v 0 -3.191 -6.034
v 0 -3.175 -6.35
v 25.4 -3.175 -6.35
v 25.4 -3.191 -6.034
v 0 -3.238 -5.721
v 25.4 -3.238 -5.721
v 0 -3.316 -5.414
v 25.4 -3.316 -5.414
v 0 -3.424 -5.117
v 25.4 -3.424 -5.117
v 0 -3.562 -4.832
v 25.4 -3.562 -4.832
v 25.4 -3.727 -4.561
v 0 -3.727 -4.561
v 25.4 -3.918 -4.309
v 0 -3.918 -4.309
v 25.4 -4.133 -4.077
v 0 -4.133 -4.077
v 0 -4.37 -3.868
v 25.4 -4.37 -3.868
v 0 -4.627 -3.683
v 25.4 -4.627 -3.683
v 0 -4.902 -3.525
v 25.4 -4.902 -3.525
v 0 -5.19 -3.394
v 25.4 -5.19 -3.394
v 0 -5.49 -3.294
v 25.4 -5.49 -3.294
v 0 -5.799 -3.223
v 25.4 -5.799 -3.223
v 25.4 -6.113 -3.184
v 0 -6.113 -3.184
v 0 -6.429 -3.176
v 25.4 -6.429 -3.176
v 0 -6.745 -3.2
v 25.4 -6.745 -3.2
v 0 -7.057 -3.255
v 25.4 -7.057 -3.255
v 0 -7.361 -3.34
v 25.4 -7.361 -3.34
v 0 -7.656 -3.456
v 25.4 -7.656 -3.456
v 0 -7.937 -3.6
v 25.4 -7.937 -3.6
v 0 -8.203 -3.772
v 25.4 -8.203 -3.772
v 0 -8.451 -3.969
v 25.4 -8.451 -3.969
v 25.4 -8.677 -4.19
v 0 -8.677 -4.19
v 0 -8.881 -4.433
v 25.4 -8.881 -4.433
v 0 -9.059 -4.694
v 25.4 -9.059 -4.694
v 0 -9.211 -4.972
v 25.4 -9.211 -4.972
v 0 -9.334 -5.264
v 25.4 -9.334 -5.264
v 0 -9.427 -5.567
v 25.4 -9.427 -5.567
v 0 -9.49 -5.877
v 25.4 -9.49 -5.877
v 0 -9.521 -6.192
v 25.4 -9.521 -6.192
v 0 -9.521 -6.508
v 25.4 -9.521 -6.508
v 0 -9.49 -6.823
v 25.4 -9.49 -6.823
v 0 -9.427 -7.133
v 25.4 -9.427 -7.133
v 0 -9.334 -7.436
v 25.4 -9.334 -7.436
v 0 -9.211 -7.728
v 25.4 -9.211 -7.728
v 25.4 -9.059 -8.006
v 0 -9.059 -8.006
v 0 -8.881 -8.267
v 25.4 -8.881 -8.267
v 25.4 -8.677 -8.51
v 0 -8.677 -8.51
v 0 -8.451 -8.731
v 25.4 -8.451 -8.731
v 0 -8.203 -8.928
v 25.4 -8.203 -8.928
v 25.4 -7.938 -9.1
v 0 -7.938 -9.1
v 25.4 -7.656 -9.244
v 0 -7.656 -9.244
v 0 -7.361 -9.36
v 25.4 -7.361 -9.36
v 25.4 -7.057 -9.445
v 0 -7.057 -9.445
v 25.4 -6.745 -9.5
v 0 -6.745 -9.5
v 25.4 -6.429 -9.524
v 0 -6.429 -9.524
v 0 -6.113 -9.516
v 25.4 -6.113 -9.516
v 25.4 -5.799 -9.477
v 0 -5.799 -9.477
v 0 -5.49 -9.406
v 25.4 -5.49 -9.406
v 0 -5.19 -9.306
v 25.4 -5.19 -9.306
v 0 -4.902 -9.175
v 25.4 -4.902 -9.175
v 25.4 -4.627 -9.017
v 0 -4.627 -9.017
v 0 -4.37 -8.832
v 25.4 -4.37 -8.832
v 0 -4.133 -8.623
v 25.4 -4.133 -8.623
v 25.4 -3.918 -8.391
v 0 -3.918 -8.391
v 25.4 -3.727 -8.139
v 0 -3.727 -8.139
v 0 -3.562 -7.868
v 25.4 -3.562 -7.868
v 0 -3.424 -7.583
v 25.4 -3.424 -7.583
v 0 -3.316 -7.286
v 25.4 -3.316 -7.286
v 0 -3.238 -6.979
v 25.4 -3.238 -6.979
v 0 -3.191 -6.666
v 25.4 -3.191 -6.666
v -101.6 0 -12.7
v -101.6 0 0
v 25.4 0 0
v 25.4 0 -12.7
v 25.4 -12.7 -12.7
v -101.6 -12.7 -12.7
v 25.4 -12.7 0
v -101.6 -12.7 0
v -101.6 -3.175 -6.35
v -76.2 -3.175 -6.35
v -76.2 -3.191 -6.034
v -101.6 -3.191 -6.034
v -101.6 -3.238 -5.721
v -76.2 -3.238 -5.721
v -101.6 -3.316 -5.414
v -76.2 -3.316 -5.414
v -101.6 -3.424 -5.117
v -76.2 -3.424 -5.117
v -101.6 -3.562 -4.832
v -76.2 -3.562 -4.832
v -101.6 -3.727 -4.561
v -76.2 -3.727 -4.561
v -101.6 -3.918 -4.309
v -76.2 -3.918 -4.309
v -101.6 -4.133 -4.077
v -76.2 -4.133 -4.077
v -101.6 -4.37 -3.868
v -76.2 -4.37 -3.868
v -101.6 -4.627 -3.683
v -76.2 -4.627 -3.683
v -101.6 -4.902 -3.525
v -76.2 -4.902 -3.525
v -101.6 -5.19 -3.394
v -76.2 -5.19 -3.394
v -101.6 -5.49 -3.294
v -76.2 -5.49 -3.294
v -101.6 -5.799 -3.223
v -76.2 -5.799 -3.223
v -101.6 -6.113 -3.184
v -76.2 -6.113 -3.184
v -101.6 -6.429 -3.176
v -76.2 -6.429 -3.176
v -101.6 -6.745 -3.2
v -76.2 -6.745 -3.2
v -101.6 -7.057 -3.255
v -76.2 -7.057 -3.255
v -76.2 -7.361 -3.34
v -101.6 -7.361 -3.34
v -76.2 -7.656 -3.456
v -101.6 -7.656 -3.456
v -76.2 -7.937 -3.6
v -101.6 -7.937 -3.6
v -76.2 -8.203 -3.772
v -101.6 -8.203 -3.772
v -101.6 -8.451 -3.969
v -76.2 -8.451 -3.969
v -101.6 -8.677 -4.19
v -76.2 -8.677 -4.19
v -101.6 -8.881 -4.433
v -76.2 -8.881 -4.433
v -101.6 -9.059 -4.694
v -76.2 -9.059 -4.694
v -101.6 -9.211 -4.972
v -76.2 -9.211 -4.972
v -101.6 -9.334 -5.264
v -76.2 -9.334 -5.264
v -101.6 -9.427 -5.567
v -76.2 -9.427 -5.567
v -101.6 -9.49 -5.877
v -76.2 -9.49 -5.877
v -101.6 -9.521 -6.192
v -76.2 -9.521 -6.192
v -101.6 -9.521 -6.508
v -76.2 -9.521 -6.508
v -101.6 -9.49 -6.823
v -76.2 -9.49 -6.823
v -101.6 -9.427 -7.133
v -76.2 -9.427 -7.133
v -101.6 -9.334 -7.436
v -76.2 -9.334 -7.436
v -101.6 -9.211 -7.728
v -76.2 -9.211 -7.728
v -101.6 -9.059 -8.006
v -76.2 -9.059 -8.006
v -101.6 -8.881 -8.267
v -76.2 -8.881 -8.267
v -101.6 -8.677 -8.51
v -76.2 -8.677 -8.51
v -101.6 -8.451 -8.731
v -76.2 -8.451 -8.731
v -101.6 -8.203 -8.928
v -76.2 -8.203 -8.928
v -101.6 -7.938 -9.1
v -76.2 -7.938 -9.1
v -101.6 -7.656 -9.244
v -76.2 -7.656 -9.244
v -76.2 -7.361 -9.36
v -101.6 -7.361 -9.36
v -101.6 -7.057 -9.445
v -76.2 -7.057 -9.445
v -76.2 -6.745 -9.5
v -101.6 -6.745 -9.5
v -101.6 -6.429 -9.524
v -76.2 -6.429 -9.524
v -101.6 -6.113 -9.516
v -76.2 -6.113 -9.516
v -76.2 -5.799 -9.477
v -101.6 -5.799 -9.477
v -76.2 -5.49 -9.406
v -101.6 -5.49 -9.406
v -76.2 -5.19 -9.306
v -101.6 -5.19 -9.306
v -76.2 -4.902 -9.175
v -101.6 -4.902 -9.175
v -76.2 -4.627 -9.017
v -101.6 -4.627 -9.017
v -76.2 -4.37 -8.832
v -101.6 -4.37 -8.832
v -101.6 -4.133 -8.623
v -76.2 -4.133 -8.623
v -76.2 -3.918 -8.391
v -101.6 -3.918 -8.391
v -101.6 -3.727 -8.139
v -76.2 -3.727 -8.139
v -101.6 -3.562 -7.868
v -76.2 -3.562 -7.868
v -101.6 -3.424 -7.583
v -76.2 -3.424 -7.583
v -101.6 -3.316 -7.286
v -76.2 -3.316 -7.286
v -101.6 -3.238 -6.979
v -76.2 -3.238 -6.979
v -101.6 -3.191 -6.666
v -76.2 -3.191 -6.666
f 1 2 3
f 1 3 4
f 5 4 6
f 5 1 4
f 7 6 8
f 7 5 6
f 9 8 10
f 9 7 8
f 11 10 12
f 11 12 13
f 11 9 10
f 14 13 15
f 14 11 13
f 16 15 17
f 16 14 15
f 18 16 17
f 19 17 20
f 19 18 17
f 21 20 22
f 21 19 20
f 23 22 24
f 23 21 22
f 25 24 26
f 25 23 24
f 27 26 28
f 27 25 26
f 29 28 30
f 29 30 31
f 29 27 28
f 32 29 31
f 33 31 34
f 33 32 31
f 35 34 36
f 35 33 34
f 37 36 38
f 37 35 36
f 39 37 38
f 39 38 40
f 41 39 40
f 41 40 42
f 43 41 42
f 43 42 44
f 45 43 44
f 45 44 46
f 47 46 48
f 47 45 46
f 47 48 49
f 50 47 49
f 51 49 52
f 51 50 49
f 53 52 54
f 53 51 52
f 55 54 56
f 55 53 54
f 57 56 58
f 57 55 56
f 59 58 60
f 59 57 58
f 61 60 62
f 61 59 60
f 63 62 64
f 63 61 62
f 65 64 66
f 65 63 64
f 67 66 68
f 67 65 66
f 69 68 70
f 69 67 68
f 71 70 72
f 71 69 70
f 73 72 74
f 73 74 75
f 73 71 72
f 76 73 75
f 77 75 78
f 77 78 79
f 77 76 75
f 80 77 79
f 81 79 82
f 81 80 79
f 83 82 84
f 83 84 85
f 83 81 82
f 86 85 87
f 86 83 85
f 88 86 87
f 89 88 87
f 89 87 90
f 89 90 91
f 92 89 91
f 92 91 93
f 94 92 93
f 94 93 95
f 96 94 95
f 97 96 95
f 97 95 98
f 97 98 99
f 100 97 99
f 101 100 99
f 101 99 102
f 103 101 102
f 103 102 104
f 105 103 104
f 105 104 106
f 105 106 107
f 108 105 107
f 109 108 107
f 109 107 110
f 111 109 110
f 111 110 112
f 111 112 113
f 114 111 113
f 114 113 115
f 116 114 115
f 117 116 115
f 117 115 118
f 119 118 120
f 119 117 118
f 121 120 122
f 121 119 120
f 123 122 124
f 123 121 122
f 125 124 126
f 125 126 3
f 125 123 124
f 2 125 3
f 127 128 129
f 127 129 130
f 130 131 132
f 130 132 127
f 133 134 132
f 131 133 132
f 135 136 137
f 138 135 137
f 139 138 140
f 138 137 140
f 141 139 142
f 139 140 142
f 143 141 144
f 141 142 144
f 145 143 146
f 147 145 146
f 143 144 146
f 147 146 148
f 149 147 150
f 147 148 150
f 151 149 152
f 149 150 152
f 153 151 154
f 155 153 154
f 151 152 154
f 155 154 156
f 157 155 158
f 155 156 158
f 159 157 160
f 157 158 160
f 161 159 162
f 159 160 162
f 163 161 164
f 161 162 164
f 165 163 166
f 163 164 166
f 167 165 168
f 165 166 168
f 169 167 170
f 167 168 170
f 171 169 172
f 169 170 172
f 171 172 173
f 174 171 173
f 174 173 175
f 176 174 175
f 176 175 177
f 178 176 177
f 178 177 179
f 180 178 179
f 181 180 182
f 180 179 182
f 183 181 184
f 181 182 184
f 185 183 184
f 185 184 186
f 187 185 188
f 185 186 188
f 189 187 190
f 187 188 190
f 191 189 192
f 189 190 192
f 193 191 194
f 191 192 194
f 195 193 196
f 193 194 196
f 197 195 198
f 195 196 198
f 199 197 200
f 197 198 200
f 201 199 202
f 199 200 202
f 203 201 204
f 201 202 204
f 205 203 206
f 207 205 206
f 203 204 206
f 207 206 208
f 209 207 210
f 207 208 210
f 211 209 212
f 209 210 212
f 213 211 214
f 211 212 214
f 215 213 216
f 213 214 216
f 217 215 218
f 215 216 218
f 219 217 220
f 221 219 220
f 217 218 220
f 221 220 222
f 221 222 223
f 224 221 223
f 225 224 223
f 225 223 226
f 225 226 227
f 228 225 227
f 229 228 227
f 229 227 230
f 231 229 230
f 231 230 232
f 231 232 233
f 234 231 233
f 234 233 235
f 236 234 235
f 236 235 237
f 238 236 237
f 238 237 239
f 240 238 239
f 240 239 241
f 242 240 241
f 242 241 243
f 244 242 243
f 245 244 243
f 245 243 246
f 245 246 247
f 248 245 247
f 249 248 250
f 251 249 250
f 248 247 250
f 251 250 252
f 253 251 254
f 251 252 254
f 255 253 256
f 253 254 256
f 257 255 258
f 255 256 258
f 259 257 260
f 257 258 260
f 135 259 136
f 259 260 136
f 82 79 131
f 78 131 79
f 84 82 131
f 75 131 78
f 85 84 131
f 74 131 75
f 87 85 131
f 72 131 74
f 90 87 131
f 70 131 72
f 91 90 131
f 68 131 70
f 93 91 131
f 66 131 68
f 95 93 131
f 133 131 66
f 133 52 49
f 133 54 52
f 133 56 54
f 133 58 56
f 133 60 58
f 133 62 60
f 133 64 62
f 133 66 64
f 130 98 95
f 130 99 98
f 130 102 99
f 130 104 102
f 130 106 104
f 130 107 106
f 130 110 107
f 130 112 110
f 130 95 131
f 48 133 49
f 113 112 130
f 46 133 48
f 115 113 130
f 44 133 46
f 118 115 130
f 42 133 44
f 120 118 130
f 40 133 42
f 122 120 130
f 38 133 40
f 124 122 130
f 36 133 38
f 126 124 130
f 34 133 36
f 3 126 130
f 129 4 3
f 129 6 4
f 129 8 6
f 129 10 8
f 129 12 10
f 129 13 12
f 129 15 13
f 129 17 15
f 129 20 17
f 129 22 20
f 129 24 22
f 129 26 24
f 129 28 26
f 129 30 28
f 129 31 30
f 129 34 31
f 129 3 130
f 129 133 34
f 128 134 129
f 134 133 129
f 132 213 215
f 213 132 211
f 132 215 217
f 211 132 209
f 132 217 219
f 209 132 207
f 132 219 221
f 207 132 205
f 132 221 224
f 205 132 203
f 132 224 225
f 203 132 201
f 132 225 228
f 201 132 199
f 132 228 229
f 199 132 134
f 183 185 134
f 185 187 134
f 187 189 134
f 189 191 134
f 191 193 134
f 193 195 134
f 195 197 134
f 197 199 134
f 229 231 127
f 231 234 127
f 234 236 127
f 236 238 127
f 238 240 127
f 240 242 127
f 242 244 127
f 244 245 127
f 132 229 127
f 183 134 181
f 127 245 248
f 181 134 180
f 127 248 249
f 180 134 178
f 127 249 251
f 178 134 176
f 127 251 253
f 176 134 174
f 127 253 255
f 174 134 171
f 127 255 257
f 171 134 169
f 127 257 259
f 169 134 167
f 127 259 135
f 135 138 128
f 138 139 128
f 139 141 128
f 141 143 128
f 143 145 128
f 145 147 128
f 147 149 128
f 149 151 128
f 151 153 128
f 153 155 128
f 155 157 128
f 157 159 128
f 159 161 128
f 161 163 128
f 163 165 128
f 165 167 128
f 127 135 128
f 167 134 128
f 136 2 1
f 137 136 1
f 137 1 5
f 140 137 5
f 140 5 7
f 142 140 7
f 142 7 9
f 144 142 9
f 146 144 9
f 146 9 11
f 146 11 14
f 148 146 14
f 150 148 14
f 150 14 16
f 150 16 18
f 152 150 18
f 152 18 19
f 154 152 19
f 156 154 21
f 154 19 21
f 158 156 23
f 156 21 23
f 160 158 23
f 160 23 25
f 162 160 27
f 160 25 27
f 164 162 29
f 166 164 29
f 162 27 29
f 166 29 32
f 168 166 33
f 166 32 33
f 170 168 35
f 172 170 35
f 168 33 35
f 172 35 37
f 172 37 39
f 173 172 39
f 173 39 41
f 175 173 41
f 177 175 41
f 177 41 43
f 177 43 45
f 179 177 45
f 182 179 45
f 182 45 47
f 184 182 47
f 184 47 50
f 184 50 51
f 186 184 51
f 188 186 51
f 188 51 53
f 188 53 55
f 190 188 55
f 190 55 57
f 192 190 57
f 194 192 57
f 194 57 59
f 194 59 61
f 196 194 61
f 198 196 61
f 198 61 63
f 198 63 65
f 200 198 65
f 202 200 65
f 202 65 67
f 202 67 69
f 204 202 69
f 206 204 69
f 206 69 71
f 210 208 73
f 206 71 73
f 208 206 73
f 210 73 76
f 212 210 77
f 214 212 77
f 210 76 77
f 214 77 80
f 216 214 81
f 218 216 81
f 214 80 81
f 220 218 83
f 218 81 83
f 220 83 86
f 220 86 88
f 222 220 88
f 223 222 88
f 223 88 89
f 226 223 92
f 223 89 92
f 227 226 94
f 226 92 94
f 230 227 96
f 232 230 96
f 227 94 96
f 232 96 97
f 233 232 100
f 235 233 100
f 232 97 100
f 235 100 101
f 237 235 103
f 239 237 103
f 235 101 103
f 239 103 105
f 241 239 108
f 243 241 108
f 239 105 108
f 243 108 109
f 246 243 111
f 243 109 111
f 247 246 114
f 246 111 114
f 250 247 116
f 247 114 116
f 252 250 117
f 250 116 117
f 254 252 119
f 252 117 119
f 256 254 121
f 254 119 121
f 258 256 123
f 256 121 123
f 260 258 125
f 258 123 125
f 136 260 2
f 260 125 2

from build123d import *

# Parameters (mm, degrees)
F0_W     = 76.2
F0_H     = 12.7
F1_DEPTH = 12.7
F2_R     = 3.175
F3_DEPTH = 85.27917
F4_DEPTH = 25.4
F5_DEPTH = 25.4


with BuildPart() as f1:
    # F0 (on Top) → F1 (new body)
    with BuildSketch(Plane.XY):
        with Locations((-38.1, -6.35)):
            Rectangle(F0_W, F0_H)
    extrude(amount=-F1_DEPTH)

    # F2 (on face) → F3 (cut)
    with BuildSketch(Plane.YZ):
        with Locations((-6.35, -6.35)):
            Circle(F2_R)
    extrude(amount=-F3_DEPTH, mode=Mode.SUBTRACT)

    # F4 (add): a face of the model
    f4_faces = [f1.faces().sort_by_distance(p)[0] for p in [
        (0, -12.5203948776, -6.35),
    ]]
    extrude(f4_faces, amount=F4_DEPTH)

    # F5 (add): a face of the model
    f5_faces = [f1.faces().sort_by_distance(p)[0] for p in [
        (-76.2, -0.1796051224, -6.35),
    ]]
    extrude(f5_faces, amount=F5_DEPTH)


solid = f1.part
